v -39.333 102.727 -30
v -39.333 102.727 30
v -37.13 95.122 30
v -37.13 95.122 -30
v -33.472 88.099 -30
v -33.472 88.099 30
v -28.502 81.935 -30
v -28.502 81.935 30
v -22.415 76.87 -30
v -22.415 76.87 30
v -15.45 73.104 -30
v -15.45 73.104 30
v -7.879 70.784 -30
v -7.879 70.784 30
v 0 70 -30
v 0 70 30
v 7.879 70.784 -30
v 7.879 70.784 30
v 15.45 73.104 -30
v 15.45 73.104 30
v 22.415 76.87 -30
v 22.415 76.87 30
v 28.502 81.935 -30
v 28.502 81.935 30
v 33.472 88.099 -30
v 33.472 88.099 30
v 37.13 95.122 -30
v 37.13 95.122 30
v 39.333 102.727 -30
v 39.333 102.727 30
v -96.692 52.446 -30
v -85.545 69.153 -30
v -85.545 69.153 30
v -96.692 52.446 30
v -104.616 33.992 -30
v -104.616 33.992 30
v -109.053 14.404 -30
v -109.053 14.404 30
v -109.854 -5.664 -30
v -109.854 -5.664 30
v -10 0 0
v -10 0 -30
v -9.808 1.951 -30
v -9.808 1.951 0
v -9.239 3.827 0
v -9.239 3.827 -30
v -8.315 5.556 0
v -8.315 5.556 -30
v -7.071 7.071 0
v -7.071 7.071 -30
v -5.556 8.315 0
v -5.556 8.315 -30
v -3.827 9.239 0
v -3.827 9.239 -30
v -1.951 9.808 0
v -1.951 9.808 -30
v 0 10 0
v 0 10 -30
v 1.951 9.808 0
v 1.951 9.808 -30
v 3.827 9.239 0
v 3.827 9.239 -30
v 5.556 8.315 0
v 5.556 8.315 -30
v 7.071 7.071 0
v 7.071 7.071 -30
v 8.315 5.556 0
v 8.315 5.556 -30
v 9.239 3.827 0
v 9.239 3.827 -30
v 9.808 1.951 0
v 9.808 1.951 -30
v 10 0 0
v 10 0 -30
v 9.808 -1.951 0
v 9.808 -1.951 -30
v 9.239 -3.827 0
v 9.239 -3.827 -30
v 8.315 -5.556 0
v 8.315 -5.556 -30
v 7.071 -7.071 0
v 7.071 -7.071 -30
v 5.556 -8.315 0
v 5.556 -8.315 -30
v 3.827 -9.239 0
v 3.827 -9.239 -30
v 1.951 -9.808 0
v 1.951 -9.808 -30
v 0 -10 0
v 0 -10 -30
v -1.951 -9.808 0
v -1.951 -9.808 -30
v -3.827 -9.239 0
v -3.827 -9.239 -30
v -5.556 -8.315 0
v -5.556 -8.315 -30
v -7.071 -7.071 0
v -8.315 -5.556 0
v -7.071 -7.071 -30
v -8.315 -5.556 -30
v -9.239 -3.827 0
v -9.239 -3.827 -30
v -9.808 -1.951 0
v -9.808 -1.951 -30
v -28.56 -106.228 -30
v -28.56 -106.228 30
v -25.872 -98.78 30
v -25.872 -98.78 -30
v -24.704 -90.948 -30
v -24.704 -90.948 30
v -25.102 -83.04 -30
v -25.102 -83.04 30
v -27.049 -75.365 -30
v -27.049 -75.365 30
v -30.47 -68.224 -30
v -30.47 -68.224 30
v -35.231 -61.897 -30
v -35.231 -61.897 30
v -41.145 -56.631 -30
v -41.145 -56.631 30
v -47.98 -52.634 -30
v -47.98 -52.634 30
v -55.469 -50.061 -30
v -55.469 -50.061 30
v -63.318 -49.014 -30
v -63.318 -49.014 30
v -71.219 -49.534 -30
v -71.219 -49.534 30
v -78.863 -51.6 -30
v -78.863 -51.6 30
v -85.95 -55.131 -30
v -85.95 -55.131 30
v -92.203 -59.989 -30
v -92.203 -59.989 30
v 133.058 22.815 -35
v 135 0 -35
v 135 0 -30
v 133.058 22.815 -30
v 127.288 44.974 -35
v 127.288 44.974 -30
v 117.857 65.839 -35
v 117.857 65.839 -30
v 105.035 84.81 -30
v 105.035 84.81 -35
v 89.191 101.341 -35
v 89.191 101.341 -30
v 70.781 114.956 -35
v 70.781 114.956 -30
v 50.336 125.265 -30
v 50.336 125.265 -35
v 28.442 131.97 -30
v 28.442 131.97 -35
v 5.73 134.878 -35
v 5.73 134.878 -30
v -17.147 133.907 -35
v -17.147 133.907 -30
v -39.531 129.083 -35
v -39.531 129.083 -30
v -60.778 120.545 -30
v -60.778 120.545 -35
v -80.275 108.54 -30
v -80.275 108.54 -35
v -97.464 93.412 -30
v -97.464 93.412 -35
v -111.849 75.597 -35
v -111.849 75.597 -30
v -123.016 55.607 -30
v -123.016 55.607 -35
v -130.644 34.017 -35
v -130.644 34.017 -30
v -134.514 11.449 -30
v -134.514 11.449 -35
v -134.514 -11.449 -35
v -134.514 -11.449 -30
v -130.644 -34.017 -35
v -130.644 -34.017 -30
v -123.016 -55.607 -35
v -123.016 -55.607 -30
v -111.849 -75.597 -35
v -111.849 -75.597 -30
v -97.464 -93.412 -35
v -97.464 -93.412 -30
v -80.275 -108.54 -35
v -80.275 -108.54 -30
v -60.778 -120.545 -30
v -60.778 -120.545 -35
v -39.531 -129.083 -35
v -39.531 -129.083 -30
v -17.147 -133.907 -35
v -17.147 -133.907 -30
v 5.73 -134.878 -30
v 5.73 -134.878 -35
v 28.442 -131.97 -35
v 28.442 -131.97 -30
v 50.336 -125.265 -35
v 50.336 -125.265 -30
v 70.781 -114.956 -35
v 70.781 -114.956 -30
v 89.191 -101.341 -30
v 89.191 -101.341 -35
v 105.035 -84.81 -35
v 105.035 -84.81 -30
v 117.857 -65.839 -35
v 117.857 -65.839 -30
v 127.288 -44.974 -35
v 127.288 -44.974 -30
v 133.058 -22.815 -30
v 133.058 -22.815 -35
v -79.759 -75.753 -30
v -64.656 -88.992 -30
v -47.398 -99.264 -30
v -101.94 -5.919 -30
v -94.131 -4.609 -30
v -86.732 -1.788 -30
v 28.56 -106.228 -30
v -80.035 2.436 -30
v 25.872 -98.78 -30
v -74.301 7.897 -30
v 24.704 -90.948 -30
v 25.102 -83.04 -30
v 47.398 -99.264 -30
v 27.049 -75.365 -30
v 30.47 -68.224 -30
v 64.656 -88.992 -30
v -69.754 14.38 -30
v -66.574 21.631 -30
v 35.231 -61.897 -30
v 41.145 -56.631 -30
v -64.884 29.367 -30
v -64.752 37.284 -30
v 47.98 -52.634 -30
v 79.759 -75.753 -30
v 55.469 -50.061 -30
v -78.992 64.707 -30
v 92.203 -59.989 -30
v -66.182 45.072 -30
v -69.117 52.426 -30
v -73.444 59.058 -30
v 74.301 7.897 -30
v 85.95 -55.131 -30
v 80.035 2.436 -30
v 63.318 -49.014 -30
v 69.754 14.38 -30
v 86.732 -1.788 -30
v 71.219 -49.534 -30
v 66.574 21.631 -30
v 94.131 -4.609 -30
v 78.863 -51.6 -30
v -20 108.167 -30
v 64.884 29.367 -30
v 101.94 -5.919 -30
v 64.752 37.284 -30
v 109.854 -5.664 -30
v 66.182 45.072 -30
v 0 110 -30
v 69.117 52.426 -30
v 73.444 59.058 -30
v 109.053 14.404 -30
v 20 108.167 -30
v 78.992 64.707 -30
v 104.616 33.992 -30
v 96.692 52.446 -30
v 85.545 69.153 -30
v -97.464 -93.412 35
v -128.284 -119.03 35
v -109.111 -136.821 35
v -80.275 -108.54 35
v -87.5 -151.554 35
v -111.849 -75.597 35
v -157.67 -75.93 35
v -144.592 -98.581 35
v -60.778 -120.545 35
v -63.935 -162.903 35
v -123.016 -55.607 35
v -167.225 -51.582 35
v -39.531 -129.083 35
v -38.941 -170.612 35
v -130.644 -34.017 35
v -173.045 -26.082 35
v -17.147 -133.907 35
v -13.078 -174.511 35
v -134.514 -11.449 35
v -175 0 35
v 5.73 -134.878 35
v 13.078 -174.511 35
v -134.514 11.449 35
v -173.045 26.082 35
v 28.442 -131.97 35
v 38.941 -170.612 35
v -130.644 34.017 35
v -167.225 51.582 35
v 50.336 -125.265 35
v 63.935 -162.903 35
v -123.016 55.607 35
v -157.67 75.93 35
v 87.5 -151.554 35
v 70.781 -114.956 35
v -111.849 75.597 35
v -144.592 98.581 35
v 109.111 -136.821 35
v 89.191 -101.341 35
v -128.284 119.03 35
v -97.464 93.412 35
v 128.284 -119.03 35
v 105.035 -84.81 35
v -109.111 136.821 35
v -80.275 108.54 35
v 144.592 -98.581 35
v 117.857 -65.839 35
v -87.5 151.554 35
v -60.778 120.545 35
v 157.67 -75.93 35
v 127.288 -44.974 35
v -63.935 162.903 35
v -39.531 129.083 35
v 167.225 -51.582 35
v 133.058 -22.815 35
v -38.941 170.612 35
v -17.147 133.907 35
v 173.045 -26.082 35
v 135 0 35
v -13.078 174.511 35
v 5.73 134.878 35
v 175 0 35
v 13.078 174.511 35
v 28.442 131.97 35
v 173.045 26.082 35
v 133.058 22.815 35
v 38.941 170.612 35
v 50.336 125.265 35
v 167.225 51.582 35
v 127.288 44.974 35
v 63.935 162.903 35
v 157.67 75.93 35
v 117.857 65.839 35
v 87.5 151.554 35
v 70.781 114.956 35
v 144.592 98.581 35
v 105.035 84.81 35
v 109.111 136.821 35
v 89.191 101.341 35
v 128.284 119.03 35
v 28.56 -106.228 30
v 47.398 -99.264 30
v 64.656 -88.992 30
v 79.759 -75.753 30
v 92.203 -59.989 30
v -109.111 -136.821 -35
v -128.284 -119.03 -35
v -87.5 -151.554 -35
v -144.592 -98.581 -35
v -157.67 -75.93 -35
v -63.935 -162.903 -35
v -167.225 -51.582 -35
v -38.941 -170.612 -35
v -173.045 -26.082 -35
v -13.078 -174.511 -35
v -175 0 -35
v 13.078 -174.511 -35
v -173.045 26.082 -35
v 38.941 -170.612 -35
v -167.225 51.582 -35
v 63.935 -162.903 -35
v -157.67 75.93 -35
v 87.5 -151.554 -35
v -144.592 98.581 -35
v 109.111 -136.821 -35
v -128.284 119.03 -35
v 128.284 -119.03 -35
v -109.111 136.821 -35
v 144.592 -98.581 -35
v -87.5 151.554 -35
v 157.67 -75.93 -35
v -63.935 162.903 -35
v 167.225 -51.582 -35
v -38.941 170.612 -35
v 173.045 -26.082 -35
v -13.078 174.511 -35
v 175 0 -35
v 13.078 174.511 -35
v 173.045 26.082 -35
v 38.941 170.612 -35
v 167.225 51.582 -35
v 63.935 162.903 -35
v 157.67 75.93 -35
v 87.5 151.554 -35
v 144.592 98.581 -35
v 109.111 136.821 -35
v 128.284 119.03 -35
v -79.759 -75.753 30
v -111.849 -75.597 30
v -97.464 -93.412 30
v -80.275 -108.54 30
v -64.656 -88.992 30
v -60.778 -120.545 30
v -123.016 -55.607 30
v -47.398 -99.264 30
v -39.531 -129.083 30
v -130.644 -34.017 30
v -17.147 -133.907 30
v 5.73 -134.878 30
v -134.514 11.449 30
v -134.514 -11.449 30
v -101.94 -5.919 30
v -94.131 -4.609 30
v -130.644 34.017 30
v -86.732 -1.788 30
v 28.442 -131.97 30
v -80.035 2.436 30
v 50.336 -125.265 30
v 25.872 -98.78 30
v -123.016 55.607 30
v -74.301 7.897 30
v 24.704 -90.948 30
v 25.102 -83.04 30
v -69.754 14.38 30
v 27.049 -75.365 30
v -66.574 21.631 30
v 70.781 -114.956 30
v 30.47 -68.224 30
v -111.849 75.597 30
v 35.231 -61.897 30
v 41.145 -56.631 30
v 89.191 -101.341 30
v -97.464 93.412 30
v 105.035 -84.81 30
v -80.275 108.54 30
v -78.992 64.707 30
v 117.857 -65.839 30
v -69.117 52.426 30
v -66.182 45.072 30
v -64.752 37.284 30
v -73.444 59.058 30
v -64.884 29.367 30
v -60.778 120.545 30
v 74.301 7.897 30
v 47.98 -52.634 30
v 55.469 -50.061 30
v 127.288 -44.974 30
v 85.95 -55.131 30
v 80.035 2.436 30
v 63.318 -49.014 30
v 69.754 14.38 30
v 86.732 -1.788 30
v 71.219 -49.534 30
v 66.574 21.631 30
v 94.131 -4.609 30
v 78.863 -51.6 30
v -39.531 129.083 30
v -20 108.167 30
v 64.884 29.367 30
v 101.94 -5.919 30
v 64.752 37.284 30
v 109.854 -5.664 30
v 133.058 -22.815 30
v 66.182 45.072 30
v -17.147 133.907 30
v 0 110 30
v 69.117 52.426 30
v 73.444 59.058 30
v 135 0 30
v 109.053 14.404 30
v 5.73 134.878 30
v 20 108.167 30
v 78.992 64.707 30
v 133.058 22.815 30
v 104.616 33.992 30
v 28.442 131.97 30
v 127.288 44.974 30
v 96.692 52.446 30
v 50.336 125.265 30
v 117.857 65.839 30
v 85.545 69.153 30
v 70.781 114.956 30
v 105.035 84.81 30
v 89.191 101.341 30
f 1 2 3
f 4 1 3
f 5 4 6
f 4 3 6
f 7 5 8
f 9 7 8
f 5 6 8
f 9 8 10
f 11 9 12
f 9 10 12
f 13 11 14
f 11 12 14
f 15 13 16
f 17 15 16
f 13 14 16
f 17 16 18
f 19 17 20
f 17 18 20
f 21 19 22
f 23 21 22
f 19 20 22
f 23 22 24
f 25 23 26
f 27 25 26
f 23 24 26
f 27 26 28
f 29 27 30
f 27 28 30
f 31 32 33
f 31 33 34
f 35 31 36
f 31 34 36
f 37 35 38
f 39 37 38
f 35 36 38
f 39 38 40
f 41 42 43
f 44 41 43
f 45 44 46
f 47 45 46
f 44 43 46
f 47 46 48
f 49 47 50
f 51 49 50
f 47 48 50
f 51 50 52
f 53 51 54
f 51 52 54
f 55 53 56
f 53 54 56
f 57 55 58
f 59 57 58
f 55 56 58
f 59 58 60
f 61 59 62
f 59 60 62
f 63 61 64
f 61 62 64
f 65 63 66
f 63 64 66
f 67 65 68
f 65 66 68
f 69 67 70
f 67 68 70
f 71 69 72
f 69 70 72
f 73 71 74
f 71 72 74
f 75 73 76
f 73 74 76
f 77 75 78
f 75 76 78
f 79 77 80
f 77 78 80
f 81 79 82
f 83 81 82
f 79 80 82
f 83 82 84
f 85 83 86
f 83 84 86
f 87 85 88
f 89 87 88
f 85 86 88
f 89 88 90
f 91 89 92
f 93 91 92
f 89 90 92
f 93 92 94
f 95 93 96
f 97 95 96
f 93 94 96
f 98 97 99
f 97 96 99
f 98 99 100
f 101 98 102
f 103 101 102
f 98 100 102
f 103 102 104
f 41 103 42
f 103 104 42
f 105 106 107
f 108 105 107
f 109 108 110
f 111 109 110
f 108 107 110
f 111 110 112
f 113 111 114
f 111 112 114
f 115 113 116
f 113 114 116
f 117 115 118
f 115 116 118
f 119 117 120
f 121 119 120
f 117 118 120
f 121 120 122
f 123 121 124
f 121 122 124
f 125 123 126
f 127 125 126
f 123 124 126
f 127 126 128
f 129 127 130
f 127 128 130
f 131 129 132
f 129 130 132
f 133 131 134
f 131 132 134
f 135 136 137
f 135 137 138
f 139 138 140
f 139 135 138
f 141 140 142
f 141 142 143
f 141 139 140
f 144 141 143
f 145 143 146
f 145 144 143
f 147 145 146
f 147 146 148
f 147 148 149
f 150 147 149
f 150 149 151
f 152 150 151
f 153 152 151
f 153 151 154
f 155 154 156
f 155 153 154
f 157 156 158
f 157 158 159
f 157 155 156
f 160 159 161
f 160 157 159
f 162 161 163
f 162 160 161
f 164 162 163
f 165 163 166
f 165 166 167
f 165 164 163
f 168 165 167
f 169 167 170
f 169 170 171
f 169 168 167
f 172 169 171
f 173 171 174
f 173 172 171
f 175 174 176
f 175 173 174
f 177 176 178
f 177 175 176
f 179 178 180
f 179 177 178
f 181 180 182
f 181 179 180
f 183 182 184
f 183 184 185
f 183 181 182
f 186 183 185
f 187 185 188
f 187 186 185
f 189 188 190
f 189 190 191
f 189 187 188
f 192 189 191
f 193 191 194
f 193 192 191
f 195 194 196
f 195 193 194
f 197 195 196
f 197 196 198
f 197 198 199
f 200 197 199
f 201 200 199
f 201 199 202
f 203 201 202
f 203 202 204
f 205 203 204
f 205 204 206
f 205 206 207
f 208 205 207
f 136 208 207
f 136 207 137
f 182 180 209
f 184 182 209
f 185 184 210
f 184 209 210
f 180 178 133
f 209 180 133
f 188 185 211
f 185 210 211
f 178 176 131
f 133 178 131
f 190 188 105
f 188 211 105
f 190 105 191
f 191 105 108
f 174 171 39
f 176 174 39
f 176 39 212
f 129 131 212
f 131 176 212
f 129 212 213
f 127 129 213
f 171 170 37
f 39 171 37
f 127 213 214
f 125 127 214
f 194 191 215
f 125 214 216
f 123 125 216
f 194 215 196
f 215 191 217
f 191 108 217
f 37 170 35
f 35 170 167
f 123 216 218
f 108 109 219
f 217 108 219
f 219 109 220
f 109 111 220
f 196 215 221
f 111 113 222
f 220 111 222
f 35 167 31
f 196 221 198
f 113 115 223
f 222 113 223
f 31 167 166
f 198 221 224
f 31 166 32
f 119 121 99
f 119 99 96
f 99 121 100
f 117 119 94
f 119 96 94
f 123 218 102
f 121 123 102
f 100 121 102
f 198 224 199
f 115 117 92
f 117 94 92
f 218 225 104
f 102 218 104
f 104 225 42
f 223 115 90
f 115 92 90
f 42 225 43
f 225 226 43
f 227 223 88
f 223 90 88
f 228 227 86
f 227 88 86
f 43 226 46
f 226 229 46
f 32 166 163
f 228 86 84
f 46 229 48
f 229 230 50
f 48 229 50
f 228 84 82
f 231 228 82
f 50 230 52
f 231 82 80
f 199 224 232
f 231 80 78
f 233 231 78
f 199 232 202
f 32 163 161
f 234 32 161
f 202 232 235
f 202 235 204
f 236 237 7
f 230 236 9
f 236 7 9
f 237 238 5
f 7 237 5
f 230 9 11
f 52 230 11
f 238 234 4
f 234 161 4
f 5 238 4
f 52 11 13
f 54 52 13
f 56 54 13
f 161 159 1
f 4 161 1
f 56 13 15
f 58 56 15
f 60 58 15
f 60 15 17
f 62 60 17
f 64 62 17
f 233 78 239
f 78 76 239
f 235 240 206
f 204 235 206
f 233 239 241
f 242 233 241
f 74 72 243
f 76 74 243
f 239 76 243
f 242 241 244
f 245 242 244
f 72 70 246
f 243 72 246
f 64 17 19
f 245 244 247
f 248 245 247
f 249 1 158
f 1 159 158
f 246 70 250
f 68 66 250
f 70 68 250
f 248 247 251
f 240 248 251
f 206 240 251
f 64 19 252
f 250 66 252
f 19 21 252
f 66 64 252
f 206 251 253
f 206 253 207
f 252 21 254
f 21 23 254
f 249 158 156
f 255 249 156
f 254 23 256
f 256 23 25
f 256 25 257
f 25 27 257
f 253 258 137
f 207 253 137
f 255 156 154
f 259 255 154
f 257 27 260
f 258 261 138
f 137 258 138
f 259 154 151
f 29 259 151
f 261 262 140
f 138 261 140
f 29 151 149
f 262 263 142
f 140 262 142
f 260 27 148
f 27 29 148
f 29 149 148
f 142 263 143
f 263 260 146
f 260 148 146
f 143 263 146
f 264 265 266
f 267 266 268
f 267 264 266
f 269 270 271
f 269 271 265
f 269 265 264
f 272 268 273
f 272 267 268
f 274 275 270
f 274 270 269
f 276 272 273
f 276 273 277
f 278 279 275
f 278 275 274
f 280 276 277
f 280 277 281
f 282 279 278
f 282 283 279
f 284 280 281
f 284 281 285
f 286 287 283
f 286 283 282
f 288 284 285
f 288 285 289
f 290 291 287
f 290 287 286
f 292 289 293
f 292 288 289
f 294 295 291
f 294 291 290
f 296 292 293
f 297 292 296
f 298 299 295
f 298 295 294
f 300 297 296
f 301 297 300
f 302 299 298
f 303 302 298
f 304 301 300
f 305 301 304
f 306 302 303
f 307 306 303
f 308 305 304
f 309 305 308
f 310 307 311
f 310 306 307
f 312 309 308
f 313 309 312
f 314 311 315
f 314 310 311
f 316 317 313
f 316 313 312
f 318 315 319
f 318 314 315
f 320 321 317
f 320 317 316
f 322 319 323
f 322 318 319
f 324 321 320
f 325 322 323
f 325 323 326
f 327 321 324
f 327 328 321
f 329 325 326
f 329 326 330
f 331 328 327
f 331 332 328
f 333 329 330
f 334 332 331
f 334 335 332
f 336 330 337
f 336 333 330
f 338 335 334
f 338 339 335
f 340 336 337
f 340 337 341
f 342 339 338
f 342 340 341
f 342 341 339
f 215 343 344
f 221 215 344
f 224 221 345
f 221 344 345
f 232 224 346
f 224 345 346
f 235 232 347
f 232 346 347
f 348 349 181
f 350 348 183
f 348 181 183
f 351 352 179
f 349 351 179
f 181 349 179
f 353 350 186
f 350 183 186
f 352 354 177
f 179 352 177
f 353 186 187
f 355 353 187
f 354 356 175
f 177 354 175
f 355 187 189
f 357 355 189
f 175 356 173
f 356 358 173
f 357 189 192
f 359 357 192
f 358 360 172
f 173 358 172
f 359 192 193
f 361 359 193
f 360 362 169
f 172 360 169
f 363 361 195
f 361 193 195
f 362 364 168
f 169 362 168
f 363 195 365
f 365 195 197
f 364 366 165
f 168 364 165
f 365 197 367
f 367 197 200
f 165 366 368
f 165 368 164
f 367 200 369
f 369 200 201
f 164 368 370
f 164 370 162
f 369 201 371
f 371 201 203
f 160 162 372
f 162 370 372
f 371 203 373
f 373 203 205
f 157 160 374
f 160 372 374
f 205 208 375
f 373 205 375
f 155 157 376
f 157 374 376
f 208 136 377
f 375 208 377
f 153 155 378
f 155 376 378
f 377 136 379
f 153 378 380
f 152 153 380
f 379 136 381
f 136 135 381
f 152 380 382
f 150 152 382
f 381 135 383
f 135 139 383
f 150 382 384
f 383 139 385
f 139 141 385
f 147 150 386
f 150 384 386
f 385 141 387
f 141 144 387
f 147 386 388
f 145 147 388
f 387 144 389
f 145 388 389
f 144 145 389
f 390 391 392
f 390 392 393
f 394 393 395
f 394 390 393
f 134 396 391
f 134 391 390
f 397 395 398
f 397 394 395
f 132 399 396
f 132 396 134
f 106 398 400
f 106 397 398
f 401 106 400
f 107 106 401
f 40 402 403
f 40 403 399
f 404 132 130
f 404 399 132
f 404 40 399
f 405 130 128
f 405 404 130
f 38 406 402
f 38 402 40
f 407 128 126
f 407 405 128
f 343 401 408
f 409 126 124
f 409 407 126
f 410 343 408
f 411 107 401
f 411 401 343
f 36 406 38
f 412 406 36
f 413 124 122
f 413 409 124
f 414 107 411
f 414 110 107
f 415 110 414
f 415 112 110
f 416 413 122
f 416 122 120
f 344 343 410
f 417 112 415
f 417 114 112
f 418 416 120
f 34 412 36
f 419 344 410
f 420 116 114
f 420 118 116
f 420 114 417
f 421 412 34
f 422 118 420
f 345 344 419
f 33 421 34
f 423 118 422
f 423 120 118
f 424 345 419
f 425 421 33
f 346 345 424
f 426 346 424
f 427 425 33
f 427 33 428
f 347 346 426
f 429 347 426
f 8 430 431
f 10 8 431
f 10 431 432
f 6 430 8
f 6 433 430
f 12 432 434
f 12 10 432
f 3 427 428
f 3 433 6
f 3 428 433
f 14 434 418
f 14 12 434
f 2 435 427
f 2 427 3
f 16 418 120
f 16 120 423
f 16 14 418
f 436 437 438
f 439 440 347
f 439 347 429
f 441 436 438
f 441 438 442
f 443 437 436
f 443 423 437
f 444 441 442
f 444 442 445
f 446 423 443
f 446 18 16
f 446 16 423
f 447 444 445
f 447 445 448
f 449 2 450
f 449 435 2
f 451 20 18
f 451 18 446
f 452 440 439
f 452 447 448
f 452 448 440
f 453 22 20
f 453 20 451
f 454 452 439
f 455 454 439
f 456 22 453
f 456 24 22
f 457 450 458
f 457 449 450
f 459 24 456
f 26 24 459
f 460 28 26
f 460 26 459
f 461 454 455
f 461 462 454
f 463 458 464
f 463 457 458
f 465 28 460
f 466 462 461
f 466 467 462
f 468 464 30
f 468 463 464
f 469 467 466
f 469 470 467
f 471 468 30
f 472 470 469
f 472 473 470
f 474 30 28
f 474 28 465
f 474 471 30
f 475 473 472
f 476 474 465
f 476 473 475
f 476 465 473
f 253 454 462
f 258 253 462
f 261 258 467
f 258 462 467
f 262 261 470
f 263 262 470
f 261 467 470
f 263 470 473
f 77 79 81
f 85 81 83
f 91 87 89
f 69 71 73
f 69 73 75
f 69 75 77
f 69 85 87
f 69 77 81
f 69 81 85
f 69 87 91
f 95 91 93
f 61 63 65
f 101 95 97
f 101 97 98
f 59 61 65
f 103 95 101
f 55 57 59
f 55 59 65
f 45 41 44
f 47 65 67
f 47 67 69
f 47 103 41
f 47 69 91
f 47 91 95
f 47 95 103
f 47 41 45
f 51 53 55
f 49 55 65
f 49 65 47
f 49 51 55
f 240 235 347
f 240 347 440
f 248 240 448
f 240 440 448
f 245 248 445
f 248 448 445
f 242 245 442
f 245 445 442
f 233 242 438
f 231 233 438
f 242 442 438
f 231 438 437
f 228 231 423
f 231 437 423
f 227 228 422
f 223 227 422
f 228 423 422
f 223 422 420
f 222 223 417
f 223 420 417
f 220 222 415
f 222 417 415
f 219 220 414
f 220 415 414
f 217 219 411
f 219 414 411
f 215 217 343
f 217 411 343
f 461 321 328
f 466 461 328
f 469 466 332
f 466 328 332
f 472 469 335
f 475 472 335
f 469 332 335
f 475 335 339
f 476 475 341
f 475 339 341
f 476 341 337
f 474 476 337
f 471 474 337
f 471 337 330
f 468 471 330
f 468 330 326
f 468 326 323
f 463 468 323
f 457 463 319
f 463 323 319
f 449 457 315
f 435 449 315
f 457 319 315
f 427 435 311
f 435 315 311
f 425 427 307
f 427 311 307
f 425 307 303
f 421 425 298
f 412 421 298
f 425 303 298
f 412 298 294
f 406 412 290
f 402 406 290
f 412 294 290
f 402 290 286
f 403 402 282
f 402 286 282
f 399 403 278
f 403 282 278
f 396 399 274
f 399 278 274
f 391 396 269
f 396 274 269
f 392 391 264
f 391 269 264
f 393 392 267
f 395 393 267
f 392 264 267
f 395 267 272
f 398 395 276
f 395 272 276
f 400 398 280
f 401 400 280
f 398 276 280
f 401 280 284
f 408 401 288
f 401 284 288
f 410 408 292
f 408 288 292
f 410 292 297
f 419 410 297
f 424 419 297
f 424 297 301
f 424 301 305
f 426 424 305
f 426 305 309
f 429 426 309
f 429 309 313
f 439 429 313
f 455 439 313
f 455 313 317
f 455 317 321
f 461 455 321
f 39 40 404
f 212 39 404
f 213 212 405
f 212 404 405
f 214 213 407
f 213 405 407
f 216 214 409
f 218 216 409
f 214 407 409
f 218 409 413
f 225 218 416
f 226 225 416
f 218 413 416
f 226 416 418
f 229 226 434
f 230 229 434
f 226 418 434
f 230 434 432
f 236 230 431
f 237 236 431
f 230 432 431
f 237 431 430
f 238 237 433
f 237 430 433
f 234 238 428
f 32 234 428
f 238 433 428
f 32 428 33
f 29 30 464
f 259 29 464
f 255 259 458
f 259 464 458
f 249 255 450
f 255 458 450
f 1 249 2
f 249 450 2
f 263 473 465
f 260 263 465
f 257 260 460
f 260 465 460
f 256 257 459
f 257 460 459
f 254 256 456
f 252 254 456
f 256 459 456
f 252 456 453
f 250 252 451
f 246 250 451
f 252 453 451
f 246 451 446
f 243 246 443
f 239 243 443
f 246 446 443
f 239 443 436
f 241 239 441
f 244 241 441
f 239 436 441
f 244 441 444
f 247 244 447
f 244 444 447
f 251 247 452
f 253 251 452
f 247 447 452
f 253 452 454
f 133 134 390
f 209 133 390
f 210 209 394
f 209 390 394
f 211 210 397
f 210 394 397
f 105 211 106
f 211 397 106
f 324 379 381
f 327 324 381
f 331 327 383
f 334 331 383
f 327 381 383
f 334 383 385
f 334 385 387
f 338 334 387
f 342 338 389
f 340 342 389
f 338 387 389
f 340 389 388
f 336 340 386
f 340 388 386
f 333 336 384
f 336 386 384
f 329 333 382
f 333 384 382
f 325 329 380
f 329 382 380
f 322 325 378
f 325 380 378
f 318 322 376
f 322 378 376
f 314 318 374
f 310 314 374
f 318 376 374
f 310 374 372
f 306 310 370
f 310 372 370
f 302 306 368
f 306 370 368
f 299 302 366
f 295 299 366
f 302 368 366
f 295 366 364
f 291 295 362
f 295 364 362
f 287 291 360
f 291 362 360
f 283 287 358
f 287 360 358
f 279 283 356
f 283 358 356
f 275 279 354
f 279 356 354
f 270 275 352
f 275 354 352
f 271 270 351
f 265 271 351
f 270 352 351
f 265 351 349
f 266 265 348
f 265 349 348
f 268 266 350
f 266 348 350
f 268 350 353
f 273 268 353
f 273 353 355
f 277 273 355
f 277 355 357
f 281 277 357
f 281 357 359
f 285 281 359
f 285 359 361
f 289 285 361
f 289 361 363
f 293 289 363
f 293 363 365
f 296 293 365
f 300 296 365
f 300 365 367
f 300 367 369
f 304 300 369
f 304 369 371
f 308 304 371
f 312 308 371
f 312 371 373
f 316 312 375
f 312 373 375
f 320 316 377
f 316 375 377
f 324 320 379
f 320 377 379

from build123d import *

# Parameters (mm, degrees)
EXTRUDE_1_DEPTH      = 35
EXTRUDE_1_DEPTH_BACK = 35
SKETCH_1_R           = 175
CUT_EXTRUDE_2_DEPTH  = 258.196422992
SKETCH_3_R           = 135
CUT_EXTRUDE_3_DEPTH  = 5
SKETCH_4_R           = 10
CUT_EXTRUDE_4_DEPTH  = 30


with BuildPart() as part:
    # 스케치1 → 보스-돌출1 (new, two sides: drawn at the far end of the back side and taken through both)
    with BuildSketch(Plane.XY.offset(-EXTRUDE_1_DEPTH_BACK)):
        Circle(SKETCH_1_R)
    extrude(amount=EXTRUDE_1_DEPTH + EXTRUDE_1_DEPTH_BACK)

    # 스케치2 → 컷-돌출2 (cut, through all)
    with BuildSketch(Plane.XY.offset(35)):
        with BuildLine():
            ThreePointArc((39.333286641, 102.727272727), (0, 110), (-39.333286641, 102.727272727))
            ThreePointArc((-39.333286641, 102.727272727), (0, 70), (39.333286641, 102.727272727))
        make_face()
        with BuildLine():
            ThreePointArc((-85.544788112, 69.152651626), (-104.616216792, 33.991869381), (-109.854096145, -5.663705509))
            ThreePointArc((-109.854096145, -5.663705509), (-66.573956141, 21.631189606), (-85.544788112, 69.152651626))
        make_face()
        with BuildLine():
            ThreePointArc((-92.202873255, -59.98858361), (-64.656377752, -88.991869381), (-28.56027858, -106.227635234))
            ThreePointArc((-28.56027858, -106.227635234), (-41.14496766, -56.631189606), (-92.202873255, -59.98858361))
        make_face()
        with BuildLine():
            ThreePointArc((28.56027858, -106.227635234), (64.656377752, -88.991869381), (92.202873255, -59.98858361))
            ThreePointArc((92.202873255, -59.98858361), (41.14496766, -56.631189606), (28.56027858, -106.227635234))
        make_face()
        with BuildLine():
            ThreePointArc((109.854096145, -5.663705509), (104.616216792, 33.991869381), (85.544788112, 69.152651626))
            ThreePointArc((85.544788112, 69.152651626), (66.573956141, 21.631189606), (109.854096145, -5.663705509))
        make_face()
    extrude(amount=-CUT_EXTRUDE_2_DEPTH, mode=Mode.SUBTRACT)

    # 스케치3 → 컷-돌출3 (cut)
    with BuildSketch(Plane.XY.offset(35)):
        Circle(SKETCH_3_R)
    cut_extrude_3 = extrude(amount=-CUT_EXTRUDE_3_DEPTH, mode=Mode.SUBTRACT)

    # 대칭 복사1: 컷-돌출3 across plane
    add(cut_extrude_3.mirror(Plane.XY), mode=Mode.SUBTRACT)

    # 스케치4 → 컷-돌출4 (cut)
    with BuildSketch(Plane(origin=(0, 0, -30), x_dir=(-1, 0, 0), z_dir=(0, 0, -1))):
        Circle(SKETCH_4_R)
    extrude(amount=-CUT_EXTRUDE_4_DEPTH, mode=Mode.SUBTRACT)


solid = part.part
